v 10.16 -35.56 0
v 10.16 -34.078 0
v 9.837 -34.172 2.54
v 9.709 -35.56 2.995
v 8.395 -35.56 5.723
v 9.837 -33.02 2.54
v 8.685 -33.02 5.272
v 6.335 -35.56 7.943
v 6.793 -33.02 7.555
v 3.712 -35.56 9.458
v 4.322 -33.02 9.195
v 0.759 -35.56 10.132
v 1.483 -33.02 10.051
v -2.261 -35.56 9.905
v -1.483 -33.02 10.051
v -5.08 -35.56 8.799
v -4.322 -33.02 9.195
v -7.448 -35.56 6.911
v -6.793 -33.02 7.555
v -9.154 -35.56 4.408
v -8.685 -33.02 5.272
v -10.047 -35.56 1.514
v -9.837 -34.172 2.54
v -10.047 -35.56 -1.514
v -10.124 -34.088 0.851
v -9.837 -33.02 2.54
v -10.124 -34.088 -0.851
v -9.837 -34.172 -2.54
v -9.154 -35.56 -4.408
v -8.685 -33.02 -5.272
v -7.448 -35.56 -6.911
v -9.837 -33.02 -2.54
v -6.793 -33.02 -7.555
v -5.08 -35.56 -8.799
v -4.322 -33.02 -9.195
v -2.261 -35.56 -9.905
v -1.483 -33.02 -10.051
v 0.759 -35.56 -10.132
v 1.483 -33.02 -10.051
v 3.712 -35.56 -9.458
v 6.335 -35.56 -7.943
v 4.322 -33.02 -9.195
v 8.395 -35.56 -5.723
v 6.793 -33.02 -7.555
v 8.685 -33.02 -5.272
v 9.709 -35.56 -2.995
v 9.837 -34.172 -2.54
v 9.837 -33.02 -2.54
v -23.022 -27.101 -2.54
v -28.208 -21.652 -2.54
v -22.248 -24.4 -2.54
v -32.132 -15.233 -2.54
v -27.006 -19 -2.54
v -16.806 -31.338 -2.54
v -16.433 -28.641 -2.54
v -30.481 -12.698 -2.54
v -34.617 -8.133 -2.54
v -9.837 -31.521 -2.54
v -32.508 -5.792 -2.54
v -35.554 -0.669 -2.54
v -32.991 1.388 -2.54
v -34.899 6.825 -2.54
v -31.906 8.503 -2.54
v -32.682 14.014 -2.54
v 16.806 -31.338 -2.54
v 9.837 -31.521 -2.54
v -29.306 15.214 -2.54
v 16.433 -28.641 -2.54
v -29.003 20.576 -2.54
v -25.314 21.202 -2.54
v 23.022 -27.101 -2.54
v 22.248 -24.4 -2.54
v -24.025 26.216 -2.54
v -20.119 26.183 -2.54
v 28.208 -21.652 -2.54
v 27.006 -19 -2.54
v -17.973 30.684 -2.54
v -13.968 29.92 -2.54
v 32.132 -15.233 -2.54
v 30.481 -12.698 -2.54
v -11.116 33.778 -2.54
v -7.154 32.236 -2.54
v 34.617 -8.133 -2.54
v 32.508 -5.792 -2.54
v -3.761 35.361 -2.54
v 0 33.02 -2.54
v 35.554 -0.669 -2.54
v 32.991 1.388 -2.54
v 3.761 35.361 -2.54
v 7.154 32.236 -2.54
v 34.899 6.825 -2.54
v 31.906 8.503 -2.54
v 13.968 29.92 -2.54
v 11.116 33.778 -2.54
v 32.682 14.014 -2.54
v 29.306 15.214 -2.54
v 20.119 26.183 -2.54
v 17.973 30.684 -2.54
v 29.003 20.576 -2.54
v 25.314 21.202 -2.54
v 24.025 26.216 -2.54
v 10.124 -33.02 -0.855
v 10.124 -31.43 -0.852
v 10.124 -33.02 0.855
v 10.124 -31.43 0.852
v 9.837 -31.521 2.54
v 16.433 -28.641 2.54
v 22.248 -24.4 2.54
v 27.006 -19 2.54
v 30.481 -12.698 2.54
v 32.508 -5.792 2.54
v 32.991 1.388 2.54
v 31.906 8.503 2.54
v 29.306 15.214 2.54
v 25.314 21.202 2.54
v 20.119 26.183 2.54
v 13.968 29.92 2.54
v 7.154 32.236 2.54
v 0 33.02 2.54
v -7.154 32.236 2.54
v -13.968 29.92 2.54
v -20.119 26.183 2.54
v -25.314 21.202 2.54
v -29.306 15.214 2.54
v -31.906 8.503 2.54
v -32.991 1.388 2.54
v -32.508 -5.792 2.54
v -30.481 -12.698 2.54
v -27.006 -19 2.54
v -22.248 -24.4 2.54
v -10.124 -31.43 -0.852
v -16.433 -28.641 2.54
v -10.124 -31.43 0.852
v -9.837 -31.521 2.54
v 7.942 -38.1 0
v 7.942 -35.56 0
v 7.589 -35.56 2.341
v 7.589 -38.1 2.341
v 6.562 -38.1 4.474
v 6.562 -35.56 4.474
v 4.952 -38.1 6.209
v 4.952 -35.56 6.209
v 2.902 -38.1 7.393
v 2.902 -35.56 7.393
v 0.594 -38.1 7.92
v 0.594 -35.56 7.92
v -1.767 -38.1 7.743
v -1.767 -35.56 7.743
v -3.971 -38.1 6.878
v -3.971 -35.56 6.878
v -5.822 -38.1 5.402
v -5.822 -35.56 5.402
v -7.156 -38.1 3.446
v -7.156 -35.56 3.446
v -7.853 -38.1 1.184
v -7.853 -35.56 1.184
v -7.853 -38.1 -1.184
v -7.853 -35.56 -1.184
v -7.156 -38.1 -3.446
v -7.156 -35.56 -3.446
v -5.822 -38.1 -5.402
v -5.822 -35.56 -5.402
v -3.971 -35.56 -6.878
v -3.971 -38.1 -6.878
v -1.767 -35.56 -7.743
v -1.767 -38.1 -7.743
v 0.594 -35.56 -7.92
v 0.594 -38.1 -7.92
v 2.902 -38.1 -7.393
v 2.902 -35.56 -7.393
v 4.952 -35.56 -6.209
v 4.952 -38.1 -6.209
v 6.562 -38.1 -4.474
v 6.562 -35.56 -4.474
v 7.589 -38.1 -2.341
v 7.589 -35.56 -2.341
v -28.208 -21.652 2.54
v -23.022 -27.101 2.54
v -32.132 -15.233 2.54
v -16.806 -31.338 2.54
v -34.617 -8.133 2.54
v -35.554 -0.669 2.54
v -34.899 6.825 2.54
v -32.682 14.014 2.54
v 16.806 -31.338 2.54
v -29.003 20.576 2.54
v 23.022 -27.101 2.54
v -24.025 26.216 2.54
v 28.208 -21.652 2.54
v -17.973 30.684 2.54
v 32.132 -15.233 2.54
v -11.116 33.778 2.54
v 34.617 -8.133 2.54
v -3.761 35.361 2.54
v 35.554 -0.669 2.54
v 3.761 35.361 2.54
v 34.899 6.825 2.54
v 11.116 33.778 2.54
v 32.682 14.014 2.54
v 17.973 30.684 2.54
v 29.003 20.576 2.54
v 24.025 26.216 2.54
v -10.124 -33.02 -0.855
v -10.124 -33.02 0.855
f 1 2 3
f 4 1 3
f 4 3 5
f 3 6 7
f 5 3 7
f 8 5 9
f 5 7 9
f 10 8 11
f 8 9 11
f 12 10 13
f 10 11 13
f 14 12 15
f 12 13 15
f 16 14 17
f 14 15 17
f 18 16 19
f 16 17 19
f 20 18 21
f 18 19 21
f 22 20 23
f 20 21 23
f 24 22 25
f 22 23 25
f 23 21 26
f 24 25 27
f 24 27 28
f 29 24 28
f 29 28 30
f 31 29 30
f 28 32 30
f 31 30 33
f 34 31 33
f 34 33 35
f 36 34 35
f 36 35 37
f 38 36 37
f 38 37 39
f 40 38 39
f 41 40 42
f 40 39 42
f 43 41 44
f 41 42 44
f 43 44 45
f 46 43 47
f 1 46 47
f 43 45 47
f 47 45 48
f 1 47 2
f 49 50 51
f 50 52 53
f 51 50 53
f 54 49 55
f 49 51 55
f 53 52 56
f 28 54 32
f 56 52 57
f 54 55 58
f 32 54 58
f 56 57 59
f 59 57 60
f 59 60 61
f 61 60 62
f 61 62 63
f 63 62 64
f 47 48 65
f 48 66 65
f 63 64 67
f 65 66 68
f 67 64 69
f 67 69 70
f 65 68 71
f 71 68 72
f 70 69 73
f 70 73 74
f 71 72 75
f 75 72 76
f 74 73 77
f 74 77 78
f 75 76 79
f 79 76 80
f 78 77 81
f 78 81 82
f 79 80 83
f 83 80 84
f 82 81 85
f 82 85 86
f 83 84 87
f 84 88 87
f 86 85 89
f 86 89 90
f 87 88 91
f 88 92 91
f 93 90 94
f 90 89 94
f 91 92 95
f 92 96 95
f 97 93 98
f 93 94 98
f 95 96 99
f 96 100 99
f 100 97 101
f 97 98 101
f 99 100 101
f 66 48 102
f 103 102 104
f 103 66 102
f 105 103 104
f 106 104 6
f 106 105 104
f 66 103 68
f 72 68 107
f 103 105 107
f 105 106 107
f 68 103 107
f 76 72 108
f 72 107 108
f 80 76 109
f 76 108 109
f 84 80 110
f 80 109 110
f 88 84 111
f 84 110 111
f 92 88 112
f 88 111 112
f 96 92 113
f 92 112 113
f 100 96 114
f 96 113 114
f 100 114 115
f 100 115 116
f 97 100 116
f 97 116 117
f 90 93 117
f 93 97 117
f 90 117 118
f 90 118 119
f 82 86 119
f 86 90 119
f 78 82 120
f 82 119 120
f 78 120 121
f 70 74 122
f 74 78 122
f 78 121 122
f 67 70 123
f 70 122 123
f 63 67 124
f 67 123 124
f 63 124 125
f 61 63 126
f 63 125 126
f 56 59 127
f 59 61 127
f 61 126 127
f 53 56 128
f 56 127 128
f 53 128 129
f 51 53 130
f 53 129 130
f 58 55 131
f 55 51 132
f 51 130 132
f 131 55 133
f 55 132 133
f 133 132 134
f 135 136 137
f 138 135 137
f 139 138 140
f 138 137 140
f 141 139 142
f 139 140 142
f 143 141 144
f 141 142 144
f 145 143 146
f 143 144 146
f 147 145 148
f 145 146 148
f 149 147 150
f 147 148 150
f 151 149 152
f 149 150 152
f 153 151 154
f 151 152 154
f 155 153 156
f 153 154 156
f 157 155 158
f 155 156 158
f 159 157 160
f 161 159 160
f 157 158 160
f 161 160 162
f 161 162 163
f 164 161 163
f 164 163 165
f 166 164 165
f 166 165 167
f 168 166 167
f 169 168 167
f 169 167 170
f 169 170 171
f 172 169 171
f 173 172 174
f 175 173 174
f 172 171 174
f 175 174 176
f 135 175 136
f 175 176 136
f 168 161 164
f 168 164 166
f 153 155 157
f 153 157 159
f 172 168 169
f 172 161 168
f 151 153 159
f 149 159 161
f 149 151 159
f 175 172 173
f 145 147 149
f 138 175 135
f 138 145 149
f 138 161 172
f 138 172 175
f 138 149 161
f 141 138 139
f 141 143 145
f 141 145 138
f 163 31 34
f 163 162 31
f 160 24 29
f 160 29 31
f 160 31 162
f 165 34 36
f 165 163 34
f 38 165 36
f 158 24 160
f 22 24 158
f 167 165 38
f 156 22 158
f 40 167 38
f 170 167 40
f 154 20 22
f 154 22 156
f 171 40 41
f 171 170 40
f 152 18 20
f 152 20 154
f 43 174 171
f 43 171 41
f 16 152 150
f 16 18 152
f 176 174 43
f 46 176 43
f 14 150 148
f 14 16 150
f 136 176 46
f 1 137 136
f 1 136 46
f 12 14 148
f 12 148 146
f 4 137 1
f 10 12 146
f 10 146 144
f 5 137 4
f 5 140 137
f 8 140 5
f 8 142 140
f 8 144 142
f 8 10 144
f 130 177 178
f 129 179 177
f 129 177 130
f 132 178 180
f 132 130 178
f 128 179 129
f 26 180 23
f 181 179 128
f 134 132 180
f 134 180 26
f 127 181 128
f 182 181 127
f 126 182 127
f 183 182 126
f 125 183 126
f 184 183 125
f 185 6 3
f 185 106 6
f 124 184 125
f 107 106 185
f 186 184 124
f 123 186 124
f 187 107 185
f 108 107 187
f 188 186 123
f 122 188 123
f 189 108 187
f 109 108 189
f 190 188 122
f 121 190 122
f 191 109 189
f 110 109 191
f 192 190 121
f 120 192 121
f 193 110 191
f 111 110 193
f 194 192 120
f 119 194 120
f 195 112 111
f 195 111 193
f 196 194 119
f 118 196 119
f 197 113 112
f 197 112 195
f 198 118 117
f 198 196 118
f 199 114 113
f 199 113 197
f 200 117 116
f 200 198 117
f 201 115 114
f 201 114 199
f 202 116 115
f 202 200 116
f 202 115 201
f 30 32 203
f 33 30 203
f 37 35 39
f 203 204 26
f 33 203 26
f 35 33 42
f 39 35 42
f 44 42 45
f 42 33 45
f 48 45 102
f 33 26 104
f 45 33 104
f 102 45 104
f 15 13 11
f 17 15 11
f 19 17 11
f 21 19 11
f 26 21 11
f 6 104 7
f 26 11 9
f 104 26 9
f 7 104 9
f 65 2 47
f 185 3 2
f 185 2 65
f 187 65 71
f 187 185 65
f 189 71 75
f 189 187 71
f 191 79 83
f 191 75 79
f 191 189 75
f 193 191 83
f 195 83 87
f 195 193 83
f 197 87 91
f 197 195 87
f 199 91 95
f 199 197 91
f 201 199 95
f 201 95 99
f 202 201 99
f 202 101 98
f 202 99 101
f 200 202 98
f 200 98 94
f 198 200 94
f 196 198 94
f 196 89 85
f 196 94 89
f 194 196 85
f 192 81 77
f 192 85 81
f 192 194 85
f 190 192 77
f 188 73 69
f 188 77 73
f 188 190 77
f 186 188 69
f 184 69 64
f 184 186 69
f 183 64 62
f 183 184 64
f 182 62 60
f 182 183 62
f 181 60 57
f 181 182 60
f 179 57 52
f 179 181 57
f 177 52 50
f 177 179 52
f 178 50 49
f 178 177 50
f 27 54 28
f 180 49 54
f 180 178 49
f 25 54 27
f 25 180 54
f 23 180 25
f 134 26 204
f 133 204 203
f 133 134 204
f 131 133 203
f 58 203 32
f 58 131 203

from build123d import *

# Parameters (mm, degrees)
F0_R     = 35.56
F0_R_2   = 33.02
F1_DEPTH = 2.54
F2_DEPTH = 2.54
F3_R     = 10.16
F4_DEPTH = 35.56
F5_DEPTH = 33.02
F6_R     = 7.94208
F7_DEPTH = 2.54


with BuildPart() as f1:
    # F0 (on Top) → F1 (new body)
    with BuildSketch(Plane.XY):
        Circle(F0_R)
        Circle(F0_R_2, mode=Mode.SUBTRACT)
    extrude(amount=F1_DEPTH)

    # F0 (on Top) → F2 (join)
    with BuildSketch(Plane.XY):
        Circle(F0_R)
        Circle(F0_R_2, mode=Mode.SUBTRACT)
    extrude(amount=-F2_DEPTH)

    # F3 (on Front) → F4 (join)
    with BuildSketch(Plane.XZ):
        Circle(F3_R)
    extrude(amount=F4_DEPTH)

    # F3 (on Front) → F5 (cut)
    with BuildSketch(Plane.XZ):
        Circle(F3_R)
    extrude(amount=F5_DEPTH, mode=Mode.SUBTRACT)

    # F6 (on face) → F7 (join)
    with BuildSketch(Plane.XZ.offset(35.56)):
        Circle(F6_R)
    extrude(amount=F7_DEPTH)


solid = f1.part
